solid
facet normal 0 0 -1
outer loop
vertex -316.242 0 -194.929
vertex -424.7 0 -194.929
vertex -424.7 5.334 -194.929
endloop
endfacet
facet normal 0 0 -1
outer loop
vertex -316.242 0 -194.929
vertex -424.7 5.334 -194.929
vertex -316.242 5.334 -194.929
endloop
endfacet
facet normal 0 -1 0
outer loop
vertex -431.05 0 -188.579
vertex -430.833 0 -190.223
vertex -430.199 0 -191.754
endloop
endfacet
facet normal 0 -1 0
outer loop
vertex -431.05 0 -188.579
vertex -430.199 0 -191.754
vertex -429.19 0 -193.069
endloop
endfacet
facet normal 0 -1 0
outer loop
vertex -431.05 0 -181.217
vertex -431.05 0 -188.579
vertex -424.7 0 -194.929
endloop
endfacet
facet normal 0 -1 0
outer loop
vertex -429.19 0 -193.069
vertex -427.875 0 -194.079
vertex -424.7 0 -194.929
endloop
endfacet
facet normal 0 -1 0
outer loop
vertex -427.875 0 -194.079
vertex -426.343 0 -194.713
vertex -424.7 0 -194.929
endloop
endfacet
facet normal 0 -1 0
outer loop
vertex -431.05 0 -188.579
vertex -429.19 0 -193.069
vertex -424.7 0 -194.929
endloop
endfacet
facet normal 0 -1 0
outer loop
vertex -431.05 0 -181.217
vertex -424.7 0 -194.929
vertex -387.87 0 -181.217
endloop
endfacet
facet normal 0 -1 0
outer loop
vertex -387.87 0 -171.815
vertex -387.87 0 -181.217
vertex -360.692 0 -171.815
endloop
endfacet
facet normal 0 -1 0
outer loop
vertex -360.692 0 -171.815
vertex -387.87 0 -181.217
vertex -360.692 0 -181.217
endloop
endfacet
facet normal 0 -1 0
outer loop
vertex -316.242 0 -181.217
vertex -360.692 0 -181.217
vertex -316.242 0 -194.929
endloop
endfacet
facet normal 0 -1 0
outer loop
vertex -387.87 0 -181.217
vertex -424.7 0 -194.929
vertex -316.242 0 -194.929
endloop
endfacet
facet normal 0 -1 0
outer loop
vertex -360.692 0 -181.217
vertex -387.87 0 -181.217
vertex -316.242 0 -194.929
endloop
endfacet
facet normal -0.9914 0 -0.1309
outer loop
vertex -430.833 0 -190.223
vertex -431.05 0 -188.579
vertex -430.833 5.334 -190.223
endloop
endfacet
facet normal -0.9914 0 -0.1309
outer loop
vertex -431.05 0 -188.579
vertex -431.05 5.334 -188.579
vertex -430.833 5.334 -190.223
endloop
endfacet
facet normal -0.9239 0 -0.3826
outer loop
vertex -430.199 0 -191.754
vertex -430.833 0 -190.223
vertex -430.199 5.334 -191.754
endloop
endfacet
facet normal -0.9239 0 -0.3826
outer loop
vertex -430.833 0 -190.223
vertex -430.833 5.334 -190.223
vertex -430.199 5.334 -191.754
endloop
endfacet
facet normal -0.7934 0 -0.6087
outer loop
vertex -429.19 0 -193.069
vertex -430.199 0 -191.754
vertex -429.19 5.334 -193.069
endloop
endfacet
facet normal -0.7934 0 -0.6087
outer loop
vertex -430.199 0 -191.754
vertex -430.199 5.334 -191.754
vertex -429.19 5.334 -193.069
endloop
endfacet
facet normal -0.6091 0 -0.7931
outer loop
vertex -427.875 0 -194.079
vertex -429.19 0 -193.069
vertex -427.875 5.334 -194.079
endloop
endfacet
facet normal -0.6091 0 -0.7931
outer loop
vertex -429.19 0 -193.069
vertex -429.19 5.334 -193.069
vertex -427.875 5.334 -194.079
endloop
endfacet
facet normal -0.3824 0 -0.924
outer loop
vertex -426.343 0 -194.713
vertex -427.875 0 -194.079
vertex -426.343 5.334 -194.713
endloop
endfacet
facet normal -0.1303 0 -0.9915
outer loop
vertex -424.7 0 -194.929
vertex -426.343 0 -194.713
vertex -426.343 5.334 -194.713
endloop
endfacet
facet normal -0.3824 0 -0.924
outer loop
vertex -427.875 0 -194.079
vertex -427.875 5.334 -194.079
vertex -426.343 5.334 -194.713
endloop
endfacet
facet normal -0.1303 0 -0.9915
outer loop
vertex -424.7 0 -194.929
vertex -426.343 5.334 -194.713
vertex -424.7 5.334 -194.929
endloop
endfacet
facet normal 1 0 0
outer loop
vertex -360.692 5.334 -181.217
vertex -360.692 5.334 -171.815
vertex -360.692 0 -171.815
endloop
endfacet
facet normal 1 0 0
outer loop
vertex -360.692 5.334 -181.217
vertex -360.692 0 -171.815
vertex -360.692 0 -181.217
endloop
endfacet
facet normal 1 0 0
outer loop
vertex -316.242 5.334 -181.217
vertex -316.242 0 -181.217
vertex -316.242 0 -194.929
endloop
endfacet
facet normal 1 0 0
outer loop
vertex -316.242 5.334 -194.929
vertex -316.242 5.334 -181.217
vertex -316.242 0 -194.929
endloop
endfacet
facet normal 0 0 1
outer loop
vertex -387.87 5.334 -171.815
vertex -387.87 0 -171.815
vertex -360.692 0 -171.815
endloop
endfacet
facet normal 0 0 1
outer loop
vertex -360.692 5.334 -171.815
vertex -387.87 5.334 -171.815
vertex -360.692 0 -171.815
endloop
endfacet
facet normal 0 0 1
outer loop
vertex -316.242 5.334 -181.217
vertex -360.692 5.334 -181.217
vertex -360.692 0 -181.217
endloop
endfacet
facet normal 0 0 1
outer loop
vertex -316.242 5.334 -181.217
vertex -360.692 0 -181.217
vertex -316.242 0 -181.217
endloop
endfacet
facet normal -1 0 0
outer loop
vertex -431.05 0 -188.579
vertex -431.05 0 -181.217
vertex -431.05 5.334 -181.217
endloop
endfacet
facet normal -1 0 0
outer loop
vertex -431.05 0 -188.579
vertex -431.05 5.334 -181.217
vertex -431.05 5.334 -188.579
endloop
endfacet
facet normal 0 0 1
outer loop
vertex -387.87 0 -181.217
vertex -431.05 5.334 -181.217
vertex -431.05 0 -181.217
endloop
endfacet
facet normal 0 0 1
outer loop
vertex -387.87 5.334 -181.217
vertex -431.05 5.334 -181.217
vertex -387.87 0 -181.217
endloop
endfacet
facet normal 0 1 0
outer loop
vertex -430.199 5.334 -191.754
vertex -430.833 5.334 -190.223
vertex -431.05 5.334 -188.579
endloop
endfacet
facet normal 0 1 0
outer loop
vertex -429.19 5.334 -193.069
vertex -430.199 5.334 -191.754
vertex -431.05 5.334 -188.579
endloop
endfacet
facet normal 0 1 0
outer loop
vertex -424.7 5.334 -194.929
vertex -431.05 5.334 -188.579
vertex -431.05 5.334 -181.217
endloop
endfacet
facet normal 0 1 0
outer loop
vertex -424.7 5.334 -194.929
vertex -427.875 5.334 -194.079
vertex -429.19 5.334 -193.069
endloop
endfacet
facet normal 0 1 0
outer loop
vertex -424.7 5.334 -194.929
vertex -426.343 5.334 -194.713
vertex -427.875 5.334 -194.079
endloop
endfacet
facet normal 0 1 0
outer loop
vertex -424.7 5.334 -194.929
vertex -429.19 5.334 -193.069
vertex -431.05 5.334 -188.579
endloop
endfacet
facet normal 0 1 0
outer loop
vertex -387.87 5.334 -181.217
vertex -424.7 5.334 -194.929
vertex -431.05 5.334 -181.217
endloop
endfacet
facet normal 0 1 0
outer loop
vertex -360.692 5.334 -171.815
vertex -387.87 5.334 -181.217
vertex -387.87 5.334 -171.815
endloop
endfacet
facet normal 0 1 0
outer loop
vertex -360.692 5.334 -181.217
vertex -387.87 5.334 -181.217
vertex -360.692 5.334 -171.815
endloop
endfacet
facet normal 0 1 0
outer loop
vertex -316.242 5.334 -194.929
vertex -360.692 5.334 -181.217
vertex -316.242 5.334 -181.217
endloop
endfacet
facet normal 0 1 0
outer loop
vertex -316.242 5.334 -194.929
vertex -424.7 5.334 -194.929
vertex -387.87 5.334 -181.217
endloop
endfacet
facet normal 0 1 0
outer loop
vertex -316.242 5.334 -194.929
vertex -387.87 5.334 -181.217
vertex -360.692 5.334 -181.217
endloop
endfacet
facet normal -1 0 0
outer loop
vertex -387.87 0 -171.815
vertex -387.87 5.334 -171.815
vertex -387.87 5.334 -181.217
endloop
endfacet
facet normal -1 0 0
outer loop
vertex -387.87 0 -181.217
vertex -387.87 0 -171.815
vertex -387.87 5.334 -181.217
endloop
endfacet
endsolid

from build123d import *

# Parameters (mm, degrees)
SKETCH1_W           = 114.808
SKETCH1_H           = 23.114
BOSS_EXTRUDE1_DEPTH = 5.334
FILLET1_R           = 6.35
SKETCH3_W           = 43.18
SKETCH3_H           = 9.401705223
SKETCH3_W_2         = 44.45
CUT_EXTRUDE2_DEPTH  = 474.106416887


with BuildPart() as part:
    # Sketch1 → Boss-Extrude1 (new body)
    with BuildSketch(Plane(origin=(0, 0, 0), x_dir=(1, 0, 0), z_dir=(0, 1, 0))):
        with Locations((-373.645654051, 183.372284322)):
            Rectangle(SKETCH1_W, SKETCH1_H)
    extrude(amount=BOSS_EXTRUDE1_DEPTH)

    # Fillet1
    fillet1_edges = [part.edges().sort_by_distance(p)[0] for p in [
        (-431.049654051, 2.667, -194.929284322),
    ]]
    fillet(fillet1_edges, radius=FILLET1_R)

    # Sketch3 → Cut-Extrude2 (cut, through all)
    with BuildSketch(Plane(origin=(0, 5.334, 0), x_dir=(1, 0, 0), z_dir=(0, 1, 0))):
        with Locations((-409.459654051, 176.516136934)):
            Rectangle(SKETCH3_W, SKETCH3_H)
        with Locations((-338.466654051, 176.516136934)):
            Rectangle(SKETCH3_W_2, SKETCH3_H)
    extrude(amount=-CUT_EXTRUDE2_DEPTH, mode=Mode.SUBTRACT)


solid = part.part
